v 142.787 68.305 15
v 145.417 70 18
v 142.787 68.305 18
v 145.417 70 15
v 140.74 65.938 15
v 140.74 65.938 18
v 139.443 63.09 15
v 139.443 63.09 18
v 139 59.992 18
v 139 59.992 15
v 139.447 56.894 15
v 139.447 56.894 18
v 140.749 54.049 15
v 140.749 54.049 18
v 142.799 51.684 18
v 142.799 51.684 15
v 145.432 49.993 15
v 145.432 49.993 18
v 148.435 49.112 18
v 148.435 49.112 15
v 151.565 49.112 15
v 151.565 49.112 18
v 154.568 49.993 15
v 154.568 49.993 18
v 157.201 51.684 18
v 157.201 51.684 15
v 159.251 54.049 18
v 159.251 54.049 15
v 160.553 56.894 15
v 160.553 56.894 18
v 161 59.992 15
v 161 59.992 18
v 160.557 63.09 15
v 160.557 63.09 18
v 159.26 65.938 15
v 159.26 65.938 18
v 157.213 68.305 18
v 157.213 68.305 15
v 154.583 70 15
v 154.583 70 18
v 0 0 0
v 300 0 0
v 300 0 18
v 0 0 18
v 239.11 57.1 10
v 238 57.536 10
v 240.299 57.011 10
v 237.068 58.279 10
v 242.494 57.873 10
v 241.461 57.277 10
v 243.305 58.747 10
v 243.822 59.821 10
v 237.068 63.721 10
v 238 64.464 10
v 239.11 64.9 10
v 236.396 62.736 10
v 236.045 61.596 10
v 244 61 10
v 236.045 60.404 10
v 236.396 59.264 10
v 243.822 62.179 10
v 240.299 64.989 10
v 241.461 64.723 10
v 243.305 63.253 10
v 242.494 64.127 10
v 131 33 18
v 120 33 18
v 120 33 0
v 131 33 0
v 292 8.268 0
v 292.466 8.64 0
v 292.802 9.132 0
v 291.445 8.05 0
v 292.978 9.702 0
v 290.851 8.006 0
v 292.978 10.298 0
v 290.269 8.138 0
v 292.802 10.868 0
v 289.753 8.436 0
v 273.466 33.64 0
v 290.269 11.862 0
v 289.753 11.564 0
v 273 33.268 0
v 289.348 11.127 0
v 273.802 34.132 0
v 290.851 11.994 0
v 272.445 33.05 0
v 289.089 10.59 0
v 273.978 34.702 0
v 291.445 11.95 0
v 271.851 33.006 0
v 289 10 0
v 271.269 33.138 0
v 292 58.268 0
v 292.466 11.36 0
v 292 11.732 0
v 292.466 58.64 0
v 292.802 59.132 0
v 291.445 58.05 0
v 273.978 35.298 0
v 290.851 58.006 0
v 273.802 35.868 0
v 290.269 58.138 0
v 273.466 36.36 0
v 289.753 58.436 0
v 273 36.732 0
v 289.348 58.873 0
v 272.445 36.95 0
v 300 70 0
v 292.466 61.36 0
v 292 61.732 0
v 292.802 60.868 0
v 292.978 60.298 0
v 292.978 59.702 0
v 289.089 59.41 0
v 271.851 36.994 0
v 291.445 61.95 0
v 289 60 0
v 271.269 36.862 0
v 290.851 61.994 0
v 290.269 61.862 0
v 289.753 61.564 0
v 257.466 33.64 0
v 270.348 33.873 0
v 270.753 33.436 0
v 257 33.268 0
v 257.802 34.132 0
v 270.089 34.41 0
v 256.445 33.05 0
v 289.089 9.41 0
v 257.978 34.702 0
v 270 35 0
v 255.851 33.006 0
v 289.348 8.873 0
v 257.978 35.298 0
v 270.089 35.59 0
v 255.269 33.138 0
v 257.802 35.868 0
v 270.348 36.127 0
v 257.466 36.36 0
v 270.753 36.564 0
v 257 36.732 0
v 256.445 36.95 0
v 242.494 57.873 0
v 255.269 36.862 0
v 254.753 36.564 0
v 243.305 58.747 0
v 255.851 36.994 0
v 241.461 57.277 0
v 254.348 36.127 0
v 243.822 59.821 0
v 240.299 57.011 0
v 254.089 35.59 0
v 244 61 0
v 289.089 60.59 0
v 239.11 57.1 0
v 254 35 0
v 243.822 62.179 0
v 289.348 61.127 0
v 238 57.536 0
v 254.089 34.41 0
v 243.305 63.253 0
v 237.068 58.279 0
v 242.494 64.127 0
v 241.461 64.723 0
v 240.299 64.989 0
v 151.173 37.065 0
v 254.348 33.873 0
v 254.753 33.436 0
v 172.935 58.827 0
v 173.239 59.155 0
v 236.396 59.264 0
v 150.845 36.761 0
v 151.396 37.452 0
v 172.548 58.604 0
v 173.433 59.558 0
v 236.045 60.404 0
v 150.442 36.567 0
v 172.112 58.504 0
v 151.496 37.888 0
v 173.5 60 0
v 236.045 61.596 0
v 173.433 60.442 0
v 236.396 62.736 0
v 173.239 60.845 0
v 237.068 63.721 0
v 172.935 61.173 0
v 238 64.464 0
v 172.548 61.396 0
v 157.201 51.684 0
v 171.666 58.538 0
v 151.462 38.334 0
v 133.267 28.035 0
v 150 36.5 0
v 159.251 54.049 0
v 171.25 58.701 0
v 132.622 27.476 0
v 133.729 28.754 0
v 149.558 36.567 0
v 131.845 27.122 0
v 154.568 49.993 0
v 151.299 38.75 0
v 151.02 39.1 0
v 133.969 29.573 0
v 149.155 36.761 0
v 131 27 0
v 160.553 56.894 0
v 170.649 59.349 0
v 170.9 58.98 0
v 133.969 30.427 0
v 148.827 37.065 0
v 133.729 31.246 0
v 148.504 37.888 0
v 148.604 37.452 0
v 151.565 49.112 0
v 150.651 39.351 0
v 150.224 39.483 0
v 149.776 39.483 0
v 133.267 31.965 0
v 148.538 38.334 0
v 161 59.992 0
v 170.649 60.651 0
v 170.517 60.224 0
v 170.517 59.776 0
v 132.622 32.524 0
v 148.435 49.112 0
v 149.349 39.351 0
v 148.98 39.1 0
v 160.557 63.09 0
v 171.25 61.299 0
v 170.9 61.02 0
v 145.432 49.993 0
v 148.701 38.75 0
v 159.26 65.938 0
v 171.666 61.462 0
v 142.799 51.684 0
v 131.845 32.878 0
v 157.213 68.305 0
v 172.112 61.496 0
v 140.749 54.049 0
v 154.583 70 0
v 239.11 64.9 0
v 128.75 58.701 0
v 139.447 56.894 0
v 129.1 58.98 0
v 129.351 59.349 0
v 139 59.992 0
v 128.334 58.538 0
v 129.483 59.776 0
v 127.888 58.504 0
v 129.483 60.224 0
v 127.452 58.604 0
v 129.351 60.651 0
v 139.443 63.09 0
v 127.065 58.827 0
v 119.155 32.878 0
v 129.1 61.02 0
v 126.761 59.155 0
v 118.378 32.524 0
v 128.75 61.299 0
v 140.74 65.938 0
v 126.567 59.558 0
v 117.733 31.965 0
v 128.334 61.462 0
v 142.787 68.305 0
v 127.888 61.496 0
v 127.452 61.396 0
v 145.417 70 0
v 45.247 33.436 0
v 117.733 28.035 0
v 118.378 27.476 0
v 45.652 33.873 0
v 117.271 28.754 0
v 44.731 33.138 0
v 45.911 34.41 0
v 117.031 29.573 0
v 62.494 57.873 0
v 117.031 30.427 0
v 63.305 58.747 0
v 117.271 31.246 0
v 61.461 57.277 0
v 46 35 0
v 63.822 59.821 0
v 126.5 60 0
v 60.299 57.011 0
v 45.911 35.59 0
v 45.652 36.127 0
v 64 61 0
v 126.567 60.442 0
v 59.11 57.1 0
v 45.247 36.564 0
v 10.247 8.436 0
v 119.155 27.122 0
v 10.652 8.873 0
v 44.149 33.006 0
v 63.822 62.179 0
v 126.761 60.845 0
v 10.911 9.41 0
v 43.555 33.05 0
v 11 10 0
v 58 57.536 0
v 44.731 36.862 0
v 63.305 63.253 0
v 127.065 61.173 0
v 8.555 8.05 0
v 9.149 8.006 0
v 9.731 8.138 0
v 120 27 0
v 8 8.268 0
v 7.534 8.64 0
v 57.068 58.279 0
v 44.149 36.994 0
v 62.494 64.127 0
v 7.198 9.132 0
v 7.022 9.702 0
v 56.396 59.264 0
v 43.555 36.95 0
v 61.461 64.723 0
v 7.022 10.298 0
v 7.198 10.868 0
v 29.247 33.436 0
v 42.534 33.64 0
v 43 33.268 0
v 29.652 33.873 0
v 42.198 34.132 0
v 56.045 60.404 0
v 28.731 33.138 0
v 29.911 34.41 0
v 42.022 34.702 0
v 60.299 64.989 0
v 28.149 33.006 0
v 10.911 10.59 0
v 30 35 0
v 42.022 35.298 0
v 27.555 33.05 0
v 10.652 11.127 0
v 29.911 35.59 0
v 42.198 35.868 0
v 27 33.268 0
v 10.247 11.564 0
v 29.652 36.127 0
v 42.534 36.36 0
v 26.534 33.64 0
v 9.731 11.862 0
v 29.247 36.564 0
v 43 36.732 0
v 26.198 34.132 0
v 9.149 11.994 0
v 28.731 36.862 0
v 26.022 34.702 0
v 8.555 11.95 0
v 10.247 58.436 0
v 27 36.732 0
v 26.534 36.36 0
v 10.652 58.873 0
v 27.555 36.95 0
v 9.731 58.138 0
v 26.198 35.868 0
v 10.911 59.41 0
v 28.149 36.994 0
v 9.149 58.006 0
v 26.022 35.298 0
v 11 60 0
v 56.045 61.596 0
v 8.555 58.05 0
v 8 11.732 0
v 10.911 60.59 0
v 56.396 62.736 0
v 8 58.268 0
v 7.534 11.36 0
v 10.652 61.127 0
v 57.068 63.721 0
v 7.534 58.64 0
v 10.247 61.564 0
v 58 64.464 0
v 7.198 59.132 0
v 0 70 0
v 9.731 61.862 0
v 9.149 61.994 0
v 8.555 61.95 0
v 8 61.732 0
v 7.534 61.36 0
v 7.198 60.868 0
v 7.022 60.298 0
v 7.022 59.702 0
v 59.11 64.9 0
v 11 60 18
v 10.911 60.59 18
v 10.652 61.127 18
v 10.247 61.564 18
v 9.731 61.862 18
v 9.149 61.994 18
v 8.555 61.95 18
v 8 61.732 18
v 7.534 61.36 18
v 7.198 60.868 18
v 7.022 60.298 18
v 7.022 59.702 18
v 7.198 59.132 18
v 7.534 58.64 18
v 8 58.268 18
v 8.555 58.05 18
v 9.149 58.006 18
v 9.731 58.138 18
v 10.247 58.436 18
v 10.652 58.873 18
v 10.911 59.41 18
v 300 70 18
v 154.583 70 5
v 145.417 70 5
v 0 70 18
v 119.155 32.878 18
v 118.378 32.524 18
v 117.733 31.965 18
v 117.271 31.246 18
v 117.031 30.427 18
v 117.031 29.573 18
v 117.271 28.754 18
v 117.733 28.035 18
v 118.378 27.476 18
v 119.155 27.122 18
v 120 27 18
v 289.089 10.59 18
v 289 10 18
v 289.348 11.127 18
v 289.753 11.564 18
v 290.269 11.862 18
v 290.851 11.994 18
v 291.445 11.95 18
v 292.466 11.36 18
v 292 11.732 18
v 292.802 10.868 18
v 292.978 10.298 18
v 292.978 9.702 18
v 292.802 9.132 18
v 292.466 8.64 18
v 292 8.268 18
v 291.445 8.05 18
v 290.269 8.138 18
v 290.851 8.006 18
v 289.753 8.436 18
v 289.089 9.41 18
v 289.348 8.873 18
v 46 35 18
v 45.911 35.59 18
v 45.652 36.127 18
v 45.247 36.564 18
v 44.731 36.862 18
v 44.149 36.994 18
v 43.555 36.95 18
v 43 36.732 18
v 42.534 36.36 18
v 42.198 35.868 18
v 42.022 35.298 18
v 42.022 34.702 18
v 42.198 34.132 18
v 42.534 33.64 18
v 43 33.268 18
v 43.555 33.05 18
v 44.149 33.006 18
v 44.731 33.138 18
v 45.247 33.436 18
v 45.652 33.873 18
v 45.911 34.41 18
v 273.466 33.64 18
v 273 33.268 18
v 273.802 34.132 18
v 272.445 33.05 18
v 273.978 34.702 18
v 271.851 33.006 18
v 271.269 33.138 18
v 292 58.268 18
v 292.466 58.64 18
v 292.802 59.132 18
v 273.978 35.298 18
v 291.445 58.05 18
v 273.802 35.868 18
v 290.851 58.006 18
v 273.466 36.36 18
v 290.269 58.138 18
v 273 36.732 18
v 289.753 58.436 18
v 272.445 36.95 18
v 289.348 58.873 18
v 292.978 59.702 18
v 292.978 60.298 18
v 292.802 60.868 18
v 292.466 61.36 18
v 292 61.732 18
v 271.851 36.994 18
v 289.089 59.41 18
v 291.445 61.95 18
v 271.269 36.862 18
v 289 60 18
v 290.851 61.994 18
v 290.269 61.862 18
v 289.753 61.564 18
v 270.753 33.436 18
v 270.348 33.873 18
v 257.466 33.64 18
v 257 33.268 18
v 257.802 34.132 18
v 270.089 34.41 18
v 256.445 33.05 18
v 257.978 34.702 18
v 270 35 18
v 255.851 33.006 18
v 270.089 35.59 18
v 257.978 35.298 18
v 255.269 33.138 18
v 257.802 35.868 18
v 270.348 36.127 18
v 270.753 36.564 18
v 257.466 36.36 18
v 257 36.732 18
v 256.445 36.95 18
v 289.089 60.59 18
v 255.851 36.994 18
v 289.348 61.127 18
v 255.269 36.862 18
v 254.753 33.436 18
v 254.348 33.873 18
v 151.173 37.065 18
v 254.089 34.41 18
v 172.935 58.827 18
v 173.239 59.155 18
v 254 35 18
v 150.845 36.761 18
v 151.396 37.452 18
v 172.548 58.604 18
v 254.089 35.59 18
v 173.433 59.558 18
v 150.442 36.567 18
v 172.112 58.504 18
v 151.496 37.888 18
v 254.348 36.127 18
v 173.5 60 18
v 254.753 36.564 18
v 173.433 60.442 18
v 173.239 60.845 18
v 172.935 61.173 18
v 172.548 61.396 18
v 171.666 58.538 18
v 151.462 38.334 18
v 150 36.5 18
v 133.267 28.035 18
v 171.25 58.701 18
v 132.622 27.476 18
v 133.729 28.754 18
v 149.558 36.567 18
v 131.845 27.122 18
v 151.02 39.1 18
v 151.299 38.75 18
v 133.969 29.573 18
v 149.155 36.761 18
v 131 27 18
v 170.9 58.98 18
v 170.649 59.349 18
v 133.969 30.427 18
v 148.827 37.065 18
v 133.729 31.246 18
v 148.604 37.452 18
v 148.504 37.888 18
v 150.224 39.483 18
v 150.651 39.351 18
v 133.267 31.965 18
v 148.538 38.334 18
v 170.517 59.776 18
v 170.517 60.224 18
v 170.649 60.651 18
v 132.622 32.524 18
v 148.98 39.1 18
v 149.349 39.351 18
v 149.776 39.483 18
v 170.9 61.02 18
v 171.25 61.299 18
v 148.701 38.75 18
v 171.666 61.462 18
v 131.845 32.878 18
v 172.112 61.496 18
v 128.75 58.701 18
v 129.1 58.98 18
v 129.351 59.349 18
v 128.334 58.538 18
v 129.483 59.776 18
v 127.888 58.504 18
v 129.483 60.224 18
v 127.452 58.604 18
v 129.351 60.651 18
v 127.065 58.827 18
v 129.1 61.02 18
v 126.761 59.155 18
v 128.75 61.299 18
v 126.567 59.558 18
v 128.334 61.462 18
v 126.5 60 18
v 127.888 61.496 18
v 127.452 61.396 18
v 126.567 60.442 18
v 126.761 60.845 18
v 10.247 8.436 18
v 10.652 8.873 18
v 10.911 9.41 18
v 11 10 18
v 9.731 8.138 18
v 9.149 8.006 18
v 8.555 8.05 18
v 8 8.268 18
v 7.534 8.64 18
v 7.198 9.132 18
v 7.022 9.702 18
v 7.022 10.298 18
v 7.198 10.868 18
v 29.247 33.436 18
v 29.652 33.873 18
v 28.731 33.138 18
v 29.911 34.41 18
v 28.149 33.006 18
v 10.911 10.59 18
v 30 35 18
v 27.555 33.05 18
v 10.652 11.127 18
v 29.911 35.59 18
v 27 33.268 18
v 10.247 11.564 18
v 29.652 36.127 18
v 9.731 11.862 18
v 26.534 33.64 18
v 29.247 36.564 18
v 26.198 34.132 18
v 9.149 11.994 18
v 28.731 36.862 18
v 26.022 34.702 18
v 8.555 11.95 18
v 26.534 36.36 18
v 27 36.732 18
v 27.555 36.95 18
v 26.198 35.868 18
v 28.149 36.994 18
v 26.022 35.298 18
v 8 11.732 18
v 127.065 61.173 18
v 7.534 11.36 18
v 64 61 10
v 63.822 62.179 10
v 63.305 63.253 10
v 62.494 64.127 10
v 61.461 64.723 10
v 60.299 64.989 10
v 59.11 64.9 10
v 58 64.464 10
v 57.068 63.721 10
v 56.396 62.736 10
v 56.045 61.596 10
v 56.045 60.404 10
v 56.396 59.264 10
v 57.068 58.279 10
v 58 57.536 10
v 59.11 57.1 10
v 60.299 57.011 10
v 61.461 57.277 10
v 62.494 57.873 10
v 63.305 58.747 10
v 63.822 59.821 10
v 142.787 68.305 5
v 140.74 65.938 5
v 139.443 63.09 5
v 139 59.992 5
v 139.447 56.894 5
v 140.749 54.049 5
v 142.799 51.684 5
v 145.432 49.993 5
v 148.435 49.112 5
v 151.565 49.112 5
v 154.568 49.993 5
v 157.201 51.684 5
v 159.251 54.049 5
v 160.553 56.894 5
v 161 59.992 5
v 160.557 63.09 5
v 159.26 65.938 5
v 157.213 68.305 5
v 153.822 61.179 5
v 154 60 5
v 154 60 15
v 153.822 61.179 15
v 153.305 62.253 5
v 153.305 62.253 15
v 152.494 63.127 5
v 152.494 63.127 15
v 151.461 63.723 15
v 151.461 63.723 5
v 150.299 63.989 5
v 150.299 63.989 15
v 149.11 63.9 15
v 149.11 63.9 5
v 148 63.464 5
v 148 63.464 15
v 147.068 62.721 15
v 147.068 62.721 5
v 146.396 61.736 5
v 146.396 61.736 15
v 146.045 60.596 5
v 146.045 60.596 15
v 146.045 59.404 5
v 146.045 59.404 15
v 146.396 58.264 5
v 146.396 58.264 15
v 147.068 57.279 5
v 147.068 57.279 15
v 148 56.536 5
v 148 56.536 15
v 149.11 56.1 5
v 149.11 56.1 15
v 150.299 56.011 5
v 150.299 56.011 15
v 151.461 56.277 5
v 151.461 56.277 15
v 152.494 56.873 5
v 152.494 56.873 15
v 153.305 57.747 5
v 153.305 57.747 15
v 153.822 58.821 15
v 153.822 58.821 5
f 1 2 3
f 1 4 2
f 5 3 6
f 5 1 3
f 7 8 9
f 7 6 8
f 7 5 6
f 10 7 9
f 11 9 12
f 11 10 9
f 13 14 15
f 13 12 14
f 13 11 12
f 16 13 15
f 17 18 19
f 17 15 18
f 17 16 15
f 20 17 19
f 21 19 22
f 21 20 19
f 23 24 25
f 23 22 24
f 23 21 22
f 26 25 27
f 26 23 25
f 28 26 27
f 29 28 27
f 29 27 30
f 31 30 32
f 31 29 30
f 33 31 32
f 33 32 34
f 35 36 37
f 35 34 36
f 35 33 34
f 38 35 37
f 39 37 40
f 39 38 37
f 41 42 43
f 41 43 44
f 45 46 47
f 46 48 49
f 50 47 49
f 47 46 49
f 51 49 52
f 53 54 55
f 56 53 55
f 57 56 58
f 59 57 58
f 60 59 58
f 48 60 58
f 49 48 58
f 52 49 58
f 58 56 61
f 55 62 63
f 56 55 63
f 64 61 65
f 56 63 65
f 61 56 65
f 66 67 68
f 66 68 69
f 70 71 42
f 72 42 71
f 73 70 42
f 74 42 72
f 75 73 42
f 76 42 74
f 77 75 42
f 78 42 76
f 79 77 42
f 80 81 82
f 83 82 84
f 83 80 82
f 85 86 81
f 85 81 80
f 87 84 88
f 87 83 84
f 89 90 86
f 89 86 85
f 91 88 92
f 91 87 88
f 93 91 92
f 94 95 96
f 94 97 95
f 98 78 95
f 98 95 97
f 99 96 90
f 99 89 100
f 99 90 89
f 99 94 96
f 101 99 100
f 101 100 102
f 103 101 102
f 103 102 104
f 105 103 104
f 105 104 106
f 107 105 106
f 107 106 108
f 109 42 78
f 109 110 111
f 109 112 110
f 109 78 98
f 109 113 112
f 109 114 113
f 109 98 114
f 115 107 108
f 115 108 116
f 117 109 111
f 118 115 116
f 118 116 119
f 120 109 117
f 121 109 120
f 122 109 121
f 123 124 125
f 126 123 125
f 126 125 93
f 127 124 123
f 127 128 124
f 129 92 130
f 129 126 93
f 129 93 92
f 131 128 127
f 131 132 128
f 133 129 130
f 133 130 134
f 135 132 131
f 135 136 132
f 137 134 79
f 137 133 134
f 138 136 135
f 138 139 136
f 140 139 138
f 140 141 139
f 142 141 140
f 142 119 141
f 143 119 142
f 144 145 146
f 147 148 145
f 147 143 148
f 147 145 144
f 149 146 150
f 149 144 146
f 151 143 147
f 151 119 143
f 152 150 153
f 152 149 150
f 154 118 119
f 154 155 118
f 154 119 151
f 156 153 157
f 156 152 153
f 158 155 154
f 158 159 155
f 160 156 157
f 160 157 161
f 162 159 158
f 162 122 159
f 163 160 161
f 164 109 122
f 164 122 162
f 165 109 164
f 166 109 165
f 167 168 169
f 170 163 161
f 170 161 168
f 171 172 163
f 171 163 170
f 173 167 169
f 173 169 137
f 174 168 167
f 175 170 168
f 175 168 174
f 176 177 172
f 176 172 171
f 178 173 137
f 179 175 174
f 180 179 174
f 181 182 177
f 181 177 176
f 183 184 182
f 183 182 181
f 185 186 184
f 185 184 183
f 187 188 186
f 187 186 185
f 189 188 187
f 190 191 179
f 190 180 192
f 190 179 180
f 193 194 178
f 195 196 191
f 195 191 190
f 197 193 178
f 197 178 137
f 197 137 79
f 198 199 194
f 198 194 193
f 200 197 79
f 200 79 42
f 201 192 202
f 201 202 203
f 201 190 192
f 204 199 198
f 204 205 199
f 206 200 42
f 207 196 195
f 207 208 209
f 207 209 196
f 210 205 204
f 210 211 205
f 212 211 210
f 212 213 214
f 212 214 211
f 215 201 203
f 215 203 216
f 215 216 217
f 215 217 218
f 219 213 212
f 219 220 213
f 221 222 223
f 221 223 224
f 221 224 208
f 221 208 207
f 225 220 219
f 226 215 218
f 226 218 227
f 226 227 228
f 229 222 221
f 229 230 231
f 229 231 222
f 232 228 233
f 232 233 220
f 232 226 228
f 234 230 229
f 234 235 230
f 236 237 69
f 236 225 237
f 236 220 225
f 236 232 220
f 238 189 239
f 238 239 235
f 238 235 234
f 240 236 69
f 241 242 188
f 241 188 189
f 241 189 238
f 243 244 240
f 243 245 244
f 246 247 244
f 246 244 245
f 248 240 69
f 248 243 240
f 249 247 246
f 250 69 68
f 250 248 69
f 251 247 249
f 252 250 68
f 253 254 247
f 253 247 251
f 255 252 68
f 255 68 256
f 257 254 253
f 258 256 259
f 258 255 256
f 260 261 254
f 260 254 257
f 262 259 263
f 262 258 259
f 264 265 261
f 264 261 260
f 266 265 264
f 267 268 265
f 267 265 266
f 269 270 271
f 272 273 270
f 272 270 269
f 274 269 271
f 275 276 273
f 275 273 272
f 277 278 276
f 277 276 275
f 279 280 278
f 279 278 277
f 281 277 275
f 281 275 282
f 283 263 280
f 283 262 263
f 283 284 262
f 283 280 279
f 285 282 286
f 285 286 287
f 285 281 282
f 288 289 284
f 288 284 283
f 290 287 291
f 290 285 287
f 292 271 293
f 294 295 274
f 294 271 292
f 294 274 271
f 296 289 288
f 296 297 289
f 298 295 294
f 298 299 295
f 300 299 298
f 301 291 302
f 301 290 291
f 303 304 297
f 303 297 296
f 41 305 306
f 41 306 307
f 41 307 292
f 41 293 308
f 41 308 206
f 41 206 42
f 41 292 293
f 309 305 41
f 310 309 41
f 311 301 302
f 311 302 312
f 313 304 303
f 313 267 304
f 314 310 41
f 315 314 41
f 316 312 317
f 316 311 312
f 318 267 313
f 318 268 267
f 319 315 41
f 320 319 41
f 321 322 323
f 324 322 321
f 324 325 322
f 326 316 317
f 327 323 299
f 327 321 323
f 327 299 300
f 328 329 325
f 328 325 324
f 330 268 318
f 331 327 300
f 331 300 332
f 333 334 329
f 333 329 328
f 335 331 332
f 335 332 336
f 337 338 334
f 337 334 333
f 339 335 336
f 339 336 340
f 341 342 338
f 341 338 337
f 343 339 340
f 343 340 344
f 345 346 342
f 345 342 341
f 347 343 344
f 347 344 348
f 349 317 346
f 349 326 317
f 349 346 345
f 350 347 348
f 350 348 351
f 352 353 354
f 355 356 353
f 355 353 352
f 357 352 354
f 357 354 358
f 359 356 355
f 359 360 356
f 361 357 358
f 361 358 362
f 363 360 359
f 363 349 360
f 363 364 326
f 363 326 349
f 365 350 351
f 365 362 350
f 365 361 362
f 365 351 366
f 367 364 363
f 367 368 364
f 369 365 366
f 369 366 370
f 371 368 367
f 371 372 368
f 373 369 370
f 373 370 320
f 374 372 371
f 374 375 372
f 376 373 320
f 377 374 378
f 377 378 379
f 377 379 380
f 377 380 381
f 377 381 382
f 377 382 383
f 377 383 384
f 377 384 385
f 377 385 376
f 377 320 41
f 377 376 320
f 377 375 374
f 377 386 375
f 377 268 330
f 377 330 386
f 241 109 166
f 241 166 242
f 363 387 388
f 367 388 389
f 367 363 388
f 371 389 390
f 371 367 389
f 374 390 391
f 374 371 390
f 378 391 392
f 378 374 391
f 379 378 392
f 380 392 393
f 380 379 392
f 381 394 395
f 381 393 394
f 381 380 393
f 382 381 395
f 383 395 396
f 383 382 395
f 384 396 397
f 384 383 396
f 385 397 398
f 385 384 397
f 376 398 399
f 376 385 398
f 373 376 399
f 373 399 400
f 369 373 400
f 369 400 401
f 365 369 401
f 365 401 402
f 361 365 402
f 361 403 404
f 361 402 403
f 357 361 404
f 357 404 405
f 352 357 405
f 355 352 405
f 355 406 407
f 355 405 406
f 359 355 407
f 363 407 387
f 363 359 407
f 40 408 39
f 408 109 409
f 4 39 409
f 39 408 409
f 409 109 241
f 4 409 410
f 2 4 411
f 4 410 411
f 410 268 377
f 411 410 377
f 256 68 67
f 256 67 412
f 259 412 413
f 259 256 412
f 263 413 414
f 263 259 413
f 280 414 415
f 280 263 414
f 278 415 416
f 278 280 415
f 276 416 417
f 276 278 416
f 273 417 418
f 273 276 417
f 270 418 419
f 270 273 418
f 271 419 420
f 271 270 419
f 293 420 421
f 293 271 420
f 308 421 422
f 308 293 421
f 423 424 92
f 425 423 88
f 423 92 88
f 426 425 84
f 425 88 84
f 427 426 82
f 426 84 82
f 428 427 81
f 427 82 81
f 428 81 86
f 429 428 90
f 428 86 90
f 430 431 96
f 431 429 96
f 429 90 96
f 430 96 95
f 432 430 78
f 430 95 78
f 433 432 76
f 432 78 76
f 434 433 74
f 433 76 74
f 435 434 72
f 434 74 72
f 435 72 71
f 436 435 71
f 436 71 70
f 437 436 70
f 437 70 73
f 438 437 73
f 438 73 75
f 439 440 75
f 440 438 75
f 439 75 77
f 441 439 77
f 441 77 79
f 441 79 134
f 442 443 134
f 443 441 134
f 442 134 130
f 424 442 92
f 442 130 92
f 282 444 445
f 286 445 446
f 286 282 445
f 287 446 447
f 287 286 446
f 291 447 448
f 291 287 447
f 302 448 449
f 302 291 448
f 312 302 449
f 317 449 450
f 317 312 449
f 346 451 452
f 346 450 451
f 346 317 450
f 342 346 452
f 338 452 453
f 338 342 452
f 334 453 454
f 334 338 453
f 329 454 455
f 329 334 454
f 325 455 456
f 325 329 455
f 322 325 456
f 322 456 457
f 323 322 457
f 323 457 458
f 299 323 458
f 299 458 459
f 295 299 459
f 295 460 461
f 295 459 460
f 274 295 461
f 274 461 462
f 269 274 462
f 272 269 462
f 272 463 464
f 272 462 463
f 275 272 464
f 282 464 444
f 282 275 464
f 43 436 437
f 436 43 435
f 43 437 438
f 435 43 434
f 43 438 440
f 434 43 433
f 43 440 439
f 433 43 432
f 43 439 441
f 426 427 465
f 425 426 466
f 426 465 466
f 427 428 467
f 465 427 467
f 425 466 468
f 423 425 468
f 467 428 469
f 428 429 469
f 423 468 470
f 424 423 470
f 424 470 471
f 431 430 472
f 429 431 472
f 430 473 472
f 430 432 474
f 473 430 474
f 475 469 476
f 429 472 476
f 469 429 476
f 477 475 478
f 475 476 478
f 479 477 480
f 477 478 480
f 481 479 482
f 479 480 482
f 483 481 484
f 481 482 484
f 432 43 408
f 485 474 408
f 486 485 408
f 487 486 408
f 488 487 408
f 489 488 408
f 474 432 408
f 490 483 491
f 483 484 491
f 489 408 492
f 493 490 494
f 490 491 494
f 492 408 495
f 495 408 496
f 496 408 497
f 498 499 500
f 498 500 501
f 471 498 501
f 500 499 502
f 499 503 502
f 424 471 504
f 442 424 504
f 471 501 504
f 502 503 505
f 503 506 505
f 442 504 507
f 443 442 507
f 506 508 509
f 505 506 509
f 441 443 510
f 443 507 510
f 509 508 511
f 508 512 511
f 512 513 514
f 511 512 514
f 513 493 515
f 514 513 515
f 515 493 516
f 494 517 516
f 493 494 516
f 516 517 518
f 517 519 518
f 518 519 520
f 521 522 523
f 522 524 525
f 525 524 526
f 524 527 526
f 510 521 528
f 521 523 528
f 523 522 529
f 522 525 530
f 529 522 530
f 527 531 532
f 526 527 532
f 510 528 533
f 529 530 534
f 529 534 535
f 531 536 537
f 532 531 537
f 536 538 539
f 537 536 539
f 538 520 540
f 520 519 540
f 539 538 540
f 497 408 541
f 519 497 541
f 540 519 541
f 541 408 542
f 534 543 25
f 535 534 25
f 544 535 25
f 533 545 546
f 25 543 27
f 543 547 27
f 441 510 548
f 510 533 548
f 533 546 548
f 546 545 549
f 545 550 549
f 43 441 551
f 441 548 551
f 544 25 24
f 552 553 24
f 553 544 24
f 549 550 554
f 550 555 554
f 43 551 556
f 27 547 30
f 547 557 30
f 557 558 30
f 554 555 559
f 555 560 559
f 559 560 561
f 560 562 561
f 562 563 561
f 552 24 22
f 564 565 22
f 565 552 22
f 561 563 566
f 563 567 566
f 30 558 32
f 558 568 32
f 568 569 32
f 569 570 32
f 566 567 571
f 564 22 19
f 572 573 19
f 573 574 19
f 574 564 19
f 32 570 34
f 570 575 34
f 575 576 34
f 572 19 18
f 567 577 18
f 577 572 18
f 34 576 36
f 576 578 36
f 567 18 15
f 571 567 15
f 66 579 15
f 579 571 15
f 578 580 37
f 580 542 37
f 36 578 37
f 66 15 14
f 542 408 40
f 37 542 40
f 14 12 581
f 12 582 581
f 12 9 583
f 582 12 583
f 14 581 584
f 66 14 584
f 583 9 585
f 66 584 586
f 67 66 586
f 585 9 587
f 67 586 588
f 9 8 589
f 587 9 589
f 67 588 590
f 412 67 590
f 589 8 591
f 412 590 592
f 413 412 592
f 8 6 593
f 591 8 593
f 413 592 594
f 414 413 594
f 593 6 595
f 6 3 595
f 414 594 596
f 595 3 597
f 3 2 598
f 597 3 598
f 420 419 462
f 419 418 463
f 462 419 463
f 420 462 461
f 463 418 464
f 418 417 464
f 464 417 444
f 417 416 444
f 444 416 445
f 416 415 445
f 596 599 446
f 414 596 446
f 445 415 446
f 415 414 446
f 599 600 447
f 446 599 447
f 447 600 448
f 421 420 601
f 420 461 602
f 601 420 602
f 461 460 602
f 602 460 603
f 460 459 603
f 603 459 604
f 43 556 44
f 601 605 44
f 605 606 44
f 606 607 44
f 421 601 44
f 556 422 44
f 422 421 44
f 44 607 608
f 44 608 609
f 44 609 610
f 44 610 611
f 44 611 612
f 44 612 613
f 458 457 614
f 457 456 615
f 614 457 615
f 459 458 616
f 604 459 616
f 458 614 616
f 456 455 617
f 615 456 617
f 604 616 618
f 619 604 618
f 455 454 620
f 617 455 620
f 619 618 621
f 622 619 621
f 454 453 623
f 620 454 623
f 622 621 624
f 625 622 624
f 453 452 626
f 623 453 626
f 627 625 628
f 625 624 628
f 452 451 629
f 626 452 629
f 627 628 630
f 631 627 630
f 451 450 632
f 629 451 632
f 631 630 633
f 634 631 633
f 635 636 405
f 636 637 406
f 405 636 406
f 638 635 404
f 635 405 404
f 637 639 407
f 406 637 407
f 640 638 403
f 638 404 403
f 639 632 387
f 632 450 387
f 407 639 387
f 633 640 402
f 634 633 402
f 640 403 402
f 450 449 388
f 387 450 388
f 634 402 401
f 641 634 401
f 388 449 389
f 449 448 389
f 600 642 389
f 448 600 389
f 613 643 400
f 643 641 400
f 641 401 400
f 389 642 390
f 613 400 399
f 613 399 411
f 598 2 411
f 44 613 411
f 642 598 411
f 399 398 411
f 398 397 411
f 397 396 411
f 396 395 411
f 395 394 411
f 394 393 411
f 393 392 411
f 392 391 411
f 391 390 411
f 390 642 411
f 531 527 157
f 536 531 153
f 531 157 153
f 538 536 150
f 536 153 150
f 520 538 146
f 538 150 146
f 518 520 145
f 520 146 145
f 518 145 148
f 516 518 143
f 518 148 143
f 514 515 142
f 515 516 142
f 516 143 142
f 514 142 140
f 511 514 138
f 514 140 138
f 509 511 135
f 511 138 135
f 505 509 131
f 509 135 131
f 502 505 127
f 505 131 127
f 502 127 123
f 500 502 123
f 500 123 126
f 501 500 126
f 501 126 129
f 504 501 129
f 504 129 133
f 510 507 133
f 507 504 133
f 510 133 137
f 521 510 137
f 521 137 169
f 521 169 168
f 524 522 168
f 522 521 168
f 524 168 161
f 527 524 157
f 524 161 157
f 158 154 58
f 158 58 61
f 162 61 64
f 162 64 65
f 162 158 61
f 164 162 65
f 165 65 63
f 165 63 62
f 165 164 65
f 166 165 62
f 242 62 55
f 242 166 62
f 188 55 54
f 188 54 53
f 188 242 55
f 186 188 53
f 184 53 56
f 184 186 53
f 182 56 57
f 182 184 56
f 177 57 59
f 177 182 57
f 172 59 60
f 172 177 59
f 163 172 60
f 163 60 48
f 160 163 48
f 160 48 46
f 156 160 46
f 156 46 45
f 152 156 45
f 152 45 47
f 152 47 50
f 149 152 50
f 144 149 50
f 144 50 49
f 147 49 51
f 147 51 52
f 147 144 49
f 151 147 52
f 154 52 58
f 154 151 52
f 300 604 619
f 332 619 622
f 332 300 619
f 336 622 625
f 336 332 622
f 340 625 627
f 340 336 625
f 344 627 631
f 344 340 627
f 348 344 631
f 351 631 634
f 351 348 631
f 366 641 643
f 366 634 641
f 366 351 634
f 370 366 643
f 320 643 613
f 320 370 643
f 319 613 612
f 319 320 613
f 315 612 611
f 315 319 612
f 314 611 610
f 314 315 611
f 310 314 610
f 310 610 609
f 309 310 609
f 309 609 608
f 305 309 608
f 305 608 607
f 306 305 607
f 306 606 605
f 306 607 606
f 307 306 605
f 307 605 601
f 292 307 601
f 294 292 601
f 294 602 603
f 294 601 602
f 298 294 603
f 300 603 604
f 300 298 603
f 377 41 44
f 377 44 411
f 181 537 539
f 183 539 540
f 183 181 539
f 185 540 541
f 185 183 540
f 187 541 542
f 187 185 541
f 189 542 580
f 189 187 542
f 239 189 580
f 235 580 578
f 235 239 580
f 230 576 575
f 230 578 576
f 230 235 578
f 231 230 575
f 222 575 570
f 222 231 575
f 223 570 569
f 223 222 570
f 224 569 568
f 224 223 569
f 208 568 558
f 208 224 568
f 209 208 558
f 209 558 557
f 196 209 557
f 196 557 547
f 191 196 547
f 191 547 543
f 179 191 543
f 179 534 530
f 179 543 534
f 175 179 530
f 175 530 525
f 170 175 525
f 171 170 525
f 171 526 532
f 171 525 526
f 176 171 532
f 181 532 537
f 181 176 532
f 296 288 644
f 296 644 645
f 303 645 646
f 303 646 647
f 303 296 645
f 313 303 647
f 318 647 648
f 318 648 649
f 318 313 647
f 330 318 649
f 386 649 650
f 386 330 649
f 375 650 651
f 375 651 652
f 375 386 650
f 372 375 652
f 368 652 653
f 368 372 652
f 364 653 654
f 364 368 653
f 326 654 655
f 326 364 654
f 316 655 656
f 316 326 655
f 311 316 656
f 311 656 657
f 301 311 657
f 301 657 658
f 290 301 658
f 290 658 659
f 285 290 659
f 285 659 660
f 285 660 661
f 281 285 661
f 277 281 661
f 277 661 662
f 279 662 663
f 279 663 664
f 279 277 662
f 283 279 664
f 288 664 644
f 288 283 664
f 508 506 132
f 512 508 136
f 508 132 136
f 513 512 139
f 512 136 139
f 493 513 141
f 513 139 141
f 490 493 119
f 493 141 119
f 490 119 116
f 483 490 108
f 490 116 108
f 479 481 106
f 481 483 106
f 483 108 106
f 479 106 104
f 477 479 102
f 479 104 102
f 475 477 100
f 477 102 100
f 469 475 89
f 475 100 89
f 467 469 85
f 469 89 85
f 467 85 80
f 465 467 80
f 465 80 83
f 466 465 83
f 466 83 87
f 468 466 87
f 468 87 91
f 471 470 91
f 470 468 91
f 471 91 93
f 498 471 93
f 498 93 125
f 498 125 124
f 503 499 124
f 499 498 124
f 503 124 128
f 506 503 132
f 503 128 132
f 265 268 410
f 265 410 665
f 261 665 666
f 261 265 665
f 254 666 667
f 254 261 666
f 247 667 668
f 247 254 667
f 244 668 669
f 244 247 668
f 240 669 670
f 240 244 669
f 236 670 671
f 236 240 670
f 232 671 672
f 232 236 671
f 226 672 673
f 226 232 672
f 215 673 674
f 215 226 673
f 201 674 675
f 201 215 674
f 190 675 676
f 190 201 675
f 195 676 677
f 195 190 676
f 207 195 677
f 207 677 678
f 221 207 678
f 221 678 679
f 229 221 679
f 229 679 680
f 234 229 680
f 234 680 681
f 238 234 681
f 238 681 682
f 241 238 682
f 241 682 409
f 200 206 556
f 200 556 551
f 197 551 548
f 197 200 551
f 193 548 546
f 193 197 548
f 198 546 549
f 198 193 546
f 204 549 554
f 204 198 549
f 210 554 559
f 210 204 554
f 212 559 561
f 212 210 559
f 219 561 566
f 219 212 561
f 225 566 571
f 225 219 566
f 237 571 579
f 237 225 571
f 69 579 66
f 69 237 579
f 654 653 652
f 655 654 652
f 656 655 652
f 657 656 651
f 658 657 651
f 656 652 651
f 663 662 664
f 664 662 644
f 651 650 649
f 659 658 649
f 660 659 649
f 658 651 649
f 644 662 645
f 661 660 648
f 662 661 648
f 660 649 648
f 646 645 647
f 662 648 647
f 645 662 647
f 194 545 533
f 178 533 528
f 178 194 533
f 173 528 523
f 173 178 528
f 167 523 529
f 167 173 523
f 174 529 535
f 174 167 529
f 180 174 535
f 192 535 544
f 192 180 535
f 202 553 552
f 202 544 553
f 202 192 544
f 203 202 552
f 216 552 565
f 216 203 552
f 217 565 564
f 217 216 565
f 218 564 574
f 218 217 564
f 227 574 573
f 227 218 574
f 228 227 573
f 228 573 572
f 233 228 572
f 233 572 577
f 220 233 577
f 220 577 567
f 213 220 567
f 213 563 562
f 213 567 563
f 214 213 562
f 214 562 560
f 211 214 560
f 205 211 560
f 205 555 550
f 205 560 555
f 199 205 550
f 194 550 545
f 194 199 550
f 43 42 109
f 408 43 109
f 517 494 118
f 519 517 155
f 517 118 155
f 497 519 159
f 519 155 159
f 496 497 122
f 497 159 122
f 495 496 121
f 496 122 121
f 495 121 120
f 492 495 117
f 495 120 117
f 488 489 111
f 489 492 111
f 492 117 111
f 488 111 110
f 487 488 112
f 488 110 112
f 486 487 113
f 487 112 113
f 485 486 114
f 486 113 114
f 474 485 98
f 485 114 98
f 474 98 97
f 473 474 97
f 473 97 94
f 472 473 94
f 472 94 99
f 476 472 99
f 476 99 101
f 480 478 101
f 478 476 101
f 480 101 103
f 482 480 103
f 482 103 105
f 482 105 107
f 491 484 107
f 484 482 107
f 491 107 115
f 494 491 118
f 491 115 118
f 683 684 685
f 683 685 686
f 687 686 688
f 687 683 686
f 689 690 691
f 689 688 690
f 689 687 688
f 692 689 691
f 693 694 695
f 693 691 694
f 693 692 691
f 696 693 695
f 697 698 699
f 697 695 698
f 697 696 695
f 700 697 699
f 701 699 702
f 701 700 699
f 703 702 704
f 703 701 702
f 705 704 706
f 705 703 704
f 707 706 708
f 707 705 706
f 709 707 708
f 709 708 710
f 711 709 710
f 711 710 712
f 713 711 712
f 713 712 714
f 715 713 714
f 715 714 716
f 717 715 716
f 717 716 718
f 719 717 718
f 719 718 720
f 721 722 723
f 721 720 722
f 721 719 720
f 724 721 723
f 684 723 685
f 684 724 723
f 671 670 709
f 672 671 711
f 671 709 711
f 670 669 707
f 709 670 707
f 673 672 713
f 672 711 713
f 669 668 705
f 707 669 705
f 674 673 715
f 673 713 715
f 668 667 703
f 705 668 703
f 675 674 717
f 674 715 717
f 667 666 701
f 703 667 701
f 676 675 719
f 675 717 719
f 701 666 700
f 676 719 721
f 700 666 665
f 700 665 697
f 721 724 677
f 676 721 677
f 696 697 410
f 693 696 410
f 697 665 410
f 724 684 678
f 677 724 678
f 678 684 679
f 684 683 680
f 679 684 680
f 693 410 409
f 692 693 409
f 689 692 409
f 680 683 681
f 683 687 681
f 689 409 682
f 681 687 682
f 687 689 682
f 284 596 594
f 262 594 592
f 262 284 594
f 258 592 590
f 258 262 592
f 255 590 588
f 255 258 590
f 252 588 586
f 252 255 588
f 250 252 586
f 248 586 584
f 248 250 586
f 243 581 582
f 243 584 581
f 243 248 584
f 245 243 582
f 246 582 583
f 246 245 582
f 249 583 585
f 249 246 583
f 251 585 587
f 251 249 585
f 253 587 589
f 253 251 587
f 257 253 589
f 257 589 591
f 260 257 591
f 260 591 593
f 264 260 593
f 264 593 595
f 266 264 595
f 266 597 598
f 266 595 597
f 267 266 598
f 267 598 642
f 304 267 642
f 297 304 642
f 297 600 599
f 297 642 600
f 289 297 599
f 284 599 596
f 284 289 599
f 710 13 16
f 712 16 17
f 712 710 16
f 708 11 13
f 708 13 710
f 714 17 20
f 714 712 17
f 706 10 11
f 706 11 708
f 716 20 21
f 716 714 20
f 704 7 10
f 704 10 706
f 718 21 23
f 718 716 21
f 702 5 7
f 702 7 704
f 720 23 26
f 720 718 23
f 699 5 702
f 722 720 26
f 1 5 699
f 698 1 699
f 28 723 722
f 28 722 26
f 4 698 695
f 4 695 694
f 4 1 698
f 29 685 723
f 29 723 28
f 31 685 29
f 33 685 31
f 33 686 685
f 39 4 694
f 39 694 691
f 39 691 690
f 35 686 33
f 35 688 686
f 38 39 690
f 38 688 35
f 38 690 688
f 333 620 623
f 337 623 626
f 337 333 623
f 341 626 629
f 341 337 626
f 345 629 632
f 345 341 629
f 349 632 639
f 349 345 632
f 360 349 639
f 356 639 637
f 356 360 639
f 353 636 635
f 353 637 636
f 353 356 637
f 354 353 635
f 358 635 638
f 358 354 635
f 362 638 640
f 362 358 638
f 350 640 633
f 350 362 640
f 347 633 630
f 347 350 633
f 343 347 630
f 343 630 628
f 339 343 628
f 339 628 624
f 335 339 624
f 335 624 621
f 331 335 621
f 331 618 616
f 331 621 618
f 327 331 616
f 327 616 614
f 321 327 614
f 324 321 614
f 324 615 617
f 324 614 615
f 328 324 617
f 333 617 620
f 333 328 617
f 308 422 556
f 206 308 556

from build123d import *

# Parameters (mm, degrees)
CYLINDER009_R     = 4
CYLINDER009_DEPTH = 10
CYLINDER008_R     = 4
CYLINDER008_DEPTH = 10
CYLINDER002_R     = 1.5
CYLINDER002_DEPTH = 25
ARRAY002_COUNT    = 4
CYLINDER003_R     = 11
CYLINDER003_DEPTH = 10
CYLINDER005_R     = 11
CYLINDER005_DEPTH = 5
CYLINDER004_R     = 4
CYLINDER004_DEPTH = 30
CYLINDER_R        = 2
CYLINDER_DEPTH    = 25
ARRAY_Y_COUNT     = 2
ARRAY_Y_PITCH     = 50
CYLINDER001_R     = 2
CYLINDER001_DEPTH = 25
ARRAY001_X_COUNT  = 2
ARRAY001_X_PITCH  = 16
BOX_W             = 150
BOX_H             = 70
BOX_DEPTH         = 18
BOX001_W          = 11
BOX001_H          = 6
BOX001_DEPTH      = 25
CYLINDER006_R     = 3
CYLINDER006_DEPTH = 25
CYLINDER007_R     = 3
CYLINDER007_DEPTH = 25


with BuildPart() as cilindro009:
    # Cylinder009 → Cylinder009 (new body)
    with BuildSketch(Plane(origin=(240, 61, 0), x_dir=(1, 0, 0), z_dir=(0, 0, 1))):
        Circle(CYLINDER009_R)
    extrude(amount=CYLINDER009_DEPTH)


with BuildPart() as cilindro008:
    # Cylinder008 → Cylinder008 (new body)
    with BuildSketch(Plane(origin=(60, 61, 0), x_dir=(1, 0, 0), z_dir=(0, 0, 1))):
        Circle(CYLINDER008_R)
    extrude(amount=CYLINDER008_DEPTH)


with BuildPart() as array002:
    # Cylinder002 → Cylinder002 (new body)
    with BuildSketch(Plane(origin=(22, 0, 0), x_dir=(1, 0, 0), z_dir=(0, 0, 1))):
        Circle(CYLINDER002_R)
    extrude(amount=CYLINDER002_DEPTH)

    # Array002: Array002 ×4 about axis
    array002_axis = Axis((0, 0, 0), (0, 0, 1))


with BuildPart() as array002_1:
    add(array002.part)
    for i in range(1, ARRAY002_COUNT):
        add(array002.part.rotate(array002_axis, i * 360 / ARRAY002_COUNT))


with BuildPart() as array002_2:
    # Array002 placement: moved
    add(array002_1.part.moved(Location((150, 60, 0))))


with BuildPart() as cilindro003:
    # Cylinder003 → Cylinder003 (new body)
    with BuildSketch(Plane.XY.offset(15)):
        Circle(CYLINDER003_R)
    extrude(amount=CYLINDER003_DEPTH)


with BuildPart() as fusion:
    # Cylinder005 → Cylinder005 (new body)
    with BuildSketch(Plane.XY):
        Circle(CYLINDER005_R)
    extrude(amount=CYLINDER005_DEPTH)

    # Fusion: union Cilindro003
    add(cilindro003.part)


with BuildPart() as fusion_1:
    # Fusion placement: moved
    add(fusion.part.moved(Location((150, 60, 0))))


with BuildPart() as huecomotor:
    # Cylinder004 → Cylinder004 (new body)
    with BuildSketch(Plane(origin=(150, 60, 0), x_dir=(1, 0, 0), z_dir=(0, 0, 1))):
        Circle(CYLINDER004_R)
    extrude(amount=CYLINDER004_DEPTH)

    # Fusion001: union Fusion
    add(fusion_1.part)


with BuildPart() as array:
    # Cylinder → Cylinder (new body)
    with BuildSketch(Plane.XY):
        Circle(CYLINDER_R)
    extrude(amount=CYLINDER_DEPTH)

    # Array Y: Array ×2


with BuildPart() as array_1:
    add(array.part)
    with Locations(*[(0, i * ARRAY_Y_PITCH, 0) for i in range(1, ARRAY_Y_COUNT)]):
        add(array.part)


with BuildPart() as array_2:
    # Array placement: moved
    add(array_1.part.moved(Location((9, 10, 0))))


with BuildPart() as array001:
    # Cylinder001 → Cylinder001 (new body)
    with BuildSketch(Plane(origin=(28, 0, 0), x_dir=(1, 0, 0), z_dir=(0, 0, 1))):
        Circle(CYLINDER001_R)
    extrude(amount=CYLINDER001_DEPTH)

    # Array001 X: Array001 ×2


with BuildPart() as array001_1:
    add(array001.part)
    with Locations(*[(i * ARRAY001_X_PITCH, 0, 0) for i in range(1, ARRAY001_X_COUNT)]):
        add(array001.part)


with BuildPart() as array001_2:
    # Array001 placement: moved
    add(array001_1.part.moved(Location((0, 35, 0))))


with BuildPart() as base:
    # Box → Box (new body)
    with BuildSketch(Plane.XY):
        with Locations((75, 35)):
            Rectangle(BOX_W, BOX_H)
    extrude(amount=BOX_DEPTH)

    # Cut: cut Array001
    add(array001_2.part, mode=Mode.SUBTRACT)

    # Cut001: cut Array
    add(array_2.part, mode=Mode.SUBTRACT)


with BuildPart() as mirror_of_base:
    # mirror: instance of Base
    add(base.part.mirror(Plane(origin=(150, 0, 0), x_dir=(0, 1, 0), z_dir=(-1, 0, 0))))


with BuildPart() as cubo001:
    # Box001 → Box001 (new body)
    with BuildSketch(Plane(origin=(120, 27, 0), x_dir=(1, 0, 0), z_dir=(0, 0, 1))):
        with Locations((5.5, 3)):
            Rectangle(BOX001_W, BOX001_H)
    extrude(amount=BOX001_DEPTH)


with BuildPart() as cilindro006:
    # Cylinder006 → Cylinder006 (new body)
    with BuildSketch(Plane(origin=(120, 30, 0), x_dir=(1, 0, 0), z_dir=(0, 0, 1))):
        Circle(CYLINDER006_R)
    extrude(amount=CYLINDER006_DEPTH)


with BuildPart() as fusion002:
    # Cylinder007 → Cylinder007 (new body)
    with BuildSketch(Plane(origin=(131, 30, 0), x_dir=(1, 0, 0), z_dir=(0, 0, 1))):
        Circle(CYLINDER007_R)
    extrude(amount=CYLINDER007_DEPTH)

    # Fusion002: union Cubo001, Cilindro006
    add(cubo001.part)
    add(cilindro006.part)


with BuildPart() as cut006:
    # Cut002 base: copy of Base
    add(base.part)

    # Cut002: cut Fusion002
    add(fusion002.part, mode=Mode.SUBTRACT)

    # Fusion003: union Mirror of Base
    add(mirror_of_base.part)

    # Cut003: cut HuecoMotor
    add(huecomotor.part, mode=Mode.SUBTRACT)

    # Cut004: cut Array002
    add(array002_2.part, mode=Mode.SUBTRACT)

    # Cut005: cut Cilindro008
    add(cilindro008.part, mode=Mode.SUBTRACT)

    # Cut006: cut Cilindro009
    add(cilindro009.part, mode=Mode.SUBTRACT)


solid = cut006.part
